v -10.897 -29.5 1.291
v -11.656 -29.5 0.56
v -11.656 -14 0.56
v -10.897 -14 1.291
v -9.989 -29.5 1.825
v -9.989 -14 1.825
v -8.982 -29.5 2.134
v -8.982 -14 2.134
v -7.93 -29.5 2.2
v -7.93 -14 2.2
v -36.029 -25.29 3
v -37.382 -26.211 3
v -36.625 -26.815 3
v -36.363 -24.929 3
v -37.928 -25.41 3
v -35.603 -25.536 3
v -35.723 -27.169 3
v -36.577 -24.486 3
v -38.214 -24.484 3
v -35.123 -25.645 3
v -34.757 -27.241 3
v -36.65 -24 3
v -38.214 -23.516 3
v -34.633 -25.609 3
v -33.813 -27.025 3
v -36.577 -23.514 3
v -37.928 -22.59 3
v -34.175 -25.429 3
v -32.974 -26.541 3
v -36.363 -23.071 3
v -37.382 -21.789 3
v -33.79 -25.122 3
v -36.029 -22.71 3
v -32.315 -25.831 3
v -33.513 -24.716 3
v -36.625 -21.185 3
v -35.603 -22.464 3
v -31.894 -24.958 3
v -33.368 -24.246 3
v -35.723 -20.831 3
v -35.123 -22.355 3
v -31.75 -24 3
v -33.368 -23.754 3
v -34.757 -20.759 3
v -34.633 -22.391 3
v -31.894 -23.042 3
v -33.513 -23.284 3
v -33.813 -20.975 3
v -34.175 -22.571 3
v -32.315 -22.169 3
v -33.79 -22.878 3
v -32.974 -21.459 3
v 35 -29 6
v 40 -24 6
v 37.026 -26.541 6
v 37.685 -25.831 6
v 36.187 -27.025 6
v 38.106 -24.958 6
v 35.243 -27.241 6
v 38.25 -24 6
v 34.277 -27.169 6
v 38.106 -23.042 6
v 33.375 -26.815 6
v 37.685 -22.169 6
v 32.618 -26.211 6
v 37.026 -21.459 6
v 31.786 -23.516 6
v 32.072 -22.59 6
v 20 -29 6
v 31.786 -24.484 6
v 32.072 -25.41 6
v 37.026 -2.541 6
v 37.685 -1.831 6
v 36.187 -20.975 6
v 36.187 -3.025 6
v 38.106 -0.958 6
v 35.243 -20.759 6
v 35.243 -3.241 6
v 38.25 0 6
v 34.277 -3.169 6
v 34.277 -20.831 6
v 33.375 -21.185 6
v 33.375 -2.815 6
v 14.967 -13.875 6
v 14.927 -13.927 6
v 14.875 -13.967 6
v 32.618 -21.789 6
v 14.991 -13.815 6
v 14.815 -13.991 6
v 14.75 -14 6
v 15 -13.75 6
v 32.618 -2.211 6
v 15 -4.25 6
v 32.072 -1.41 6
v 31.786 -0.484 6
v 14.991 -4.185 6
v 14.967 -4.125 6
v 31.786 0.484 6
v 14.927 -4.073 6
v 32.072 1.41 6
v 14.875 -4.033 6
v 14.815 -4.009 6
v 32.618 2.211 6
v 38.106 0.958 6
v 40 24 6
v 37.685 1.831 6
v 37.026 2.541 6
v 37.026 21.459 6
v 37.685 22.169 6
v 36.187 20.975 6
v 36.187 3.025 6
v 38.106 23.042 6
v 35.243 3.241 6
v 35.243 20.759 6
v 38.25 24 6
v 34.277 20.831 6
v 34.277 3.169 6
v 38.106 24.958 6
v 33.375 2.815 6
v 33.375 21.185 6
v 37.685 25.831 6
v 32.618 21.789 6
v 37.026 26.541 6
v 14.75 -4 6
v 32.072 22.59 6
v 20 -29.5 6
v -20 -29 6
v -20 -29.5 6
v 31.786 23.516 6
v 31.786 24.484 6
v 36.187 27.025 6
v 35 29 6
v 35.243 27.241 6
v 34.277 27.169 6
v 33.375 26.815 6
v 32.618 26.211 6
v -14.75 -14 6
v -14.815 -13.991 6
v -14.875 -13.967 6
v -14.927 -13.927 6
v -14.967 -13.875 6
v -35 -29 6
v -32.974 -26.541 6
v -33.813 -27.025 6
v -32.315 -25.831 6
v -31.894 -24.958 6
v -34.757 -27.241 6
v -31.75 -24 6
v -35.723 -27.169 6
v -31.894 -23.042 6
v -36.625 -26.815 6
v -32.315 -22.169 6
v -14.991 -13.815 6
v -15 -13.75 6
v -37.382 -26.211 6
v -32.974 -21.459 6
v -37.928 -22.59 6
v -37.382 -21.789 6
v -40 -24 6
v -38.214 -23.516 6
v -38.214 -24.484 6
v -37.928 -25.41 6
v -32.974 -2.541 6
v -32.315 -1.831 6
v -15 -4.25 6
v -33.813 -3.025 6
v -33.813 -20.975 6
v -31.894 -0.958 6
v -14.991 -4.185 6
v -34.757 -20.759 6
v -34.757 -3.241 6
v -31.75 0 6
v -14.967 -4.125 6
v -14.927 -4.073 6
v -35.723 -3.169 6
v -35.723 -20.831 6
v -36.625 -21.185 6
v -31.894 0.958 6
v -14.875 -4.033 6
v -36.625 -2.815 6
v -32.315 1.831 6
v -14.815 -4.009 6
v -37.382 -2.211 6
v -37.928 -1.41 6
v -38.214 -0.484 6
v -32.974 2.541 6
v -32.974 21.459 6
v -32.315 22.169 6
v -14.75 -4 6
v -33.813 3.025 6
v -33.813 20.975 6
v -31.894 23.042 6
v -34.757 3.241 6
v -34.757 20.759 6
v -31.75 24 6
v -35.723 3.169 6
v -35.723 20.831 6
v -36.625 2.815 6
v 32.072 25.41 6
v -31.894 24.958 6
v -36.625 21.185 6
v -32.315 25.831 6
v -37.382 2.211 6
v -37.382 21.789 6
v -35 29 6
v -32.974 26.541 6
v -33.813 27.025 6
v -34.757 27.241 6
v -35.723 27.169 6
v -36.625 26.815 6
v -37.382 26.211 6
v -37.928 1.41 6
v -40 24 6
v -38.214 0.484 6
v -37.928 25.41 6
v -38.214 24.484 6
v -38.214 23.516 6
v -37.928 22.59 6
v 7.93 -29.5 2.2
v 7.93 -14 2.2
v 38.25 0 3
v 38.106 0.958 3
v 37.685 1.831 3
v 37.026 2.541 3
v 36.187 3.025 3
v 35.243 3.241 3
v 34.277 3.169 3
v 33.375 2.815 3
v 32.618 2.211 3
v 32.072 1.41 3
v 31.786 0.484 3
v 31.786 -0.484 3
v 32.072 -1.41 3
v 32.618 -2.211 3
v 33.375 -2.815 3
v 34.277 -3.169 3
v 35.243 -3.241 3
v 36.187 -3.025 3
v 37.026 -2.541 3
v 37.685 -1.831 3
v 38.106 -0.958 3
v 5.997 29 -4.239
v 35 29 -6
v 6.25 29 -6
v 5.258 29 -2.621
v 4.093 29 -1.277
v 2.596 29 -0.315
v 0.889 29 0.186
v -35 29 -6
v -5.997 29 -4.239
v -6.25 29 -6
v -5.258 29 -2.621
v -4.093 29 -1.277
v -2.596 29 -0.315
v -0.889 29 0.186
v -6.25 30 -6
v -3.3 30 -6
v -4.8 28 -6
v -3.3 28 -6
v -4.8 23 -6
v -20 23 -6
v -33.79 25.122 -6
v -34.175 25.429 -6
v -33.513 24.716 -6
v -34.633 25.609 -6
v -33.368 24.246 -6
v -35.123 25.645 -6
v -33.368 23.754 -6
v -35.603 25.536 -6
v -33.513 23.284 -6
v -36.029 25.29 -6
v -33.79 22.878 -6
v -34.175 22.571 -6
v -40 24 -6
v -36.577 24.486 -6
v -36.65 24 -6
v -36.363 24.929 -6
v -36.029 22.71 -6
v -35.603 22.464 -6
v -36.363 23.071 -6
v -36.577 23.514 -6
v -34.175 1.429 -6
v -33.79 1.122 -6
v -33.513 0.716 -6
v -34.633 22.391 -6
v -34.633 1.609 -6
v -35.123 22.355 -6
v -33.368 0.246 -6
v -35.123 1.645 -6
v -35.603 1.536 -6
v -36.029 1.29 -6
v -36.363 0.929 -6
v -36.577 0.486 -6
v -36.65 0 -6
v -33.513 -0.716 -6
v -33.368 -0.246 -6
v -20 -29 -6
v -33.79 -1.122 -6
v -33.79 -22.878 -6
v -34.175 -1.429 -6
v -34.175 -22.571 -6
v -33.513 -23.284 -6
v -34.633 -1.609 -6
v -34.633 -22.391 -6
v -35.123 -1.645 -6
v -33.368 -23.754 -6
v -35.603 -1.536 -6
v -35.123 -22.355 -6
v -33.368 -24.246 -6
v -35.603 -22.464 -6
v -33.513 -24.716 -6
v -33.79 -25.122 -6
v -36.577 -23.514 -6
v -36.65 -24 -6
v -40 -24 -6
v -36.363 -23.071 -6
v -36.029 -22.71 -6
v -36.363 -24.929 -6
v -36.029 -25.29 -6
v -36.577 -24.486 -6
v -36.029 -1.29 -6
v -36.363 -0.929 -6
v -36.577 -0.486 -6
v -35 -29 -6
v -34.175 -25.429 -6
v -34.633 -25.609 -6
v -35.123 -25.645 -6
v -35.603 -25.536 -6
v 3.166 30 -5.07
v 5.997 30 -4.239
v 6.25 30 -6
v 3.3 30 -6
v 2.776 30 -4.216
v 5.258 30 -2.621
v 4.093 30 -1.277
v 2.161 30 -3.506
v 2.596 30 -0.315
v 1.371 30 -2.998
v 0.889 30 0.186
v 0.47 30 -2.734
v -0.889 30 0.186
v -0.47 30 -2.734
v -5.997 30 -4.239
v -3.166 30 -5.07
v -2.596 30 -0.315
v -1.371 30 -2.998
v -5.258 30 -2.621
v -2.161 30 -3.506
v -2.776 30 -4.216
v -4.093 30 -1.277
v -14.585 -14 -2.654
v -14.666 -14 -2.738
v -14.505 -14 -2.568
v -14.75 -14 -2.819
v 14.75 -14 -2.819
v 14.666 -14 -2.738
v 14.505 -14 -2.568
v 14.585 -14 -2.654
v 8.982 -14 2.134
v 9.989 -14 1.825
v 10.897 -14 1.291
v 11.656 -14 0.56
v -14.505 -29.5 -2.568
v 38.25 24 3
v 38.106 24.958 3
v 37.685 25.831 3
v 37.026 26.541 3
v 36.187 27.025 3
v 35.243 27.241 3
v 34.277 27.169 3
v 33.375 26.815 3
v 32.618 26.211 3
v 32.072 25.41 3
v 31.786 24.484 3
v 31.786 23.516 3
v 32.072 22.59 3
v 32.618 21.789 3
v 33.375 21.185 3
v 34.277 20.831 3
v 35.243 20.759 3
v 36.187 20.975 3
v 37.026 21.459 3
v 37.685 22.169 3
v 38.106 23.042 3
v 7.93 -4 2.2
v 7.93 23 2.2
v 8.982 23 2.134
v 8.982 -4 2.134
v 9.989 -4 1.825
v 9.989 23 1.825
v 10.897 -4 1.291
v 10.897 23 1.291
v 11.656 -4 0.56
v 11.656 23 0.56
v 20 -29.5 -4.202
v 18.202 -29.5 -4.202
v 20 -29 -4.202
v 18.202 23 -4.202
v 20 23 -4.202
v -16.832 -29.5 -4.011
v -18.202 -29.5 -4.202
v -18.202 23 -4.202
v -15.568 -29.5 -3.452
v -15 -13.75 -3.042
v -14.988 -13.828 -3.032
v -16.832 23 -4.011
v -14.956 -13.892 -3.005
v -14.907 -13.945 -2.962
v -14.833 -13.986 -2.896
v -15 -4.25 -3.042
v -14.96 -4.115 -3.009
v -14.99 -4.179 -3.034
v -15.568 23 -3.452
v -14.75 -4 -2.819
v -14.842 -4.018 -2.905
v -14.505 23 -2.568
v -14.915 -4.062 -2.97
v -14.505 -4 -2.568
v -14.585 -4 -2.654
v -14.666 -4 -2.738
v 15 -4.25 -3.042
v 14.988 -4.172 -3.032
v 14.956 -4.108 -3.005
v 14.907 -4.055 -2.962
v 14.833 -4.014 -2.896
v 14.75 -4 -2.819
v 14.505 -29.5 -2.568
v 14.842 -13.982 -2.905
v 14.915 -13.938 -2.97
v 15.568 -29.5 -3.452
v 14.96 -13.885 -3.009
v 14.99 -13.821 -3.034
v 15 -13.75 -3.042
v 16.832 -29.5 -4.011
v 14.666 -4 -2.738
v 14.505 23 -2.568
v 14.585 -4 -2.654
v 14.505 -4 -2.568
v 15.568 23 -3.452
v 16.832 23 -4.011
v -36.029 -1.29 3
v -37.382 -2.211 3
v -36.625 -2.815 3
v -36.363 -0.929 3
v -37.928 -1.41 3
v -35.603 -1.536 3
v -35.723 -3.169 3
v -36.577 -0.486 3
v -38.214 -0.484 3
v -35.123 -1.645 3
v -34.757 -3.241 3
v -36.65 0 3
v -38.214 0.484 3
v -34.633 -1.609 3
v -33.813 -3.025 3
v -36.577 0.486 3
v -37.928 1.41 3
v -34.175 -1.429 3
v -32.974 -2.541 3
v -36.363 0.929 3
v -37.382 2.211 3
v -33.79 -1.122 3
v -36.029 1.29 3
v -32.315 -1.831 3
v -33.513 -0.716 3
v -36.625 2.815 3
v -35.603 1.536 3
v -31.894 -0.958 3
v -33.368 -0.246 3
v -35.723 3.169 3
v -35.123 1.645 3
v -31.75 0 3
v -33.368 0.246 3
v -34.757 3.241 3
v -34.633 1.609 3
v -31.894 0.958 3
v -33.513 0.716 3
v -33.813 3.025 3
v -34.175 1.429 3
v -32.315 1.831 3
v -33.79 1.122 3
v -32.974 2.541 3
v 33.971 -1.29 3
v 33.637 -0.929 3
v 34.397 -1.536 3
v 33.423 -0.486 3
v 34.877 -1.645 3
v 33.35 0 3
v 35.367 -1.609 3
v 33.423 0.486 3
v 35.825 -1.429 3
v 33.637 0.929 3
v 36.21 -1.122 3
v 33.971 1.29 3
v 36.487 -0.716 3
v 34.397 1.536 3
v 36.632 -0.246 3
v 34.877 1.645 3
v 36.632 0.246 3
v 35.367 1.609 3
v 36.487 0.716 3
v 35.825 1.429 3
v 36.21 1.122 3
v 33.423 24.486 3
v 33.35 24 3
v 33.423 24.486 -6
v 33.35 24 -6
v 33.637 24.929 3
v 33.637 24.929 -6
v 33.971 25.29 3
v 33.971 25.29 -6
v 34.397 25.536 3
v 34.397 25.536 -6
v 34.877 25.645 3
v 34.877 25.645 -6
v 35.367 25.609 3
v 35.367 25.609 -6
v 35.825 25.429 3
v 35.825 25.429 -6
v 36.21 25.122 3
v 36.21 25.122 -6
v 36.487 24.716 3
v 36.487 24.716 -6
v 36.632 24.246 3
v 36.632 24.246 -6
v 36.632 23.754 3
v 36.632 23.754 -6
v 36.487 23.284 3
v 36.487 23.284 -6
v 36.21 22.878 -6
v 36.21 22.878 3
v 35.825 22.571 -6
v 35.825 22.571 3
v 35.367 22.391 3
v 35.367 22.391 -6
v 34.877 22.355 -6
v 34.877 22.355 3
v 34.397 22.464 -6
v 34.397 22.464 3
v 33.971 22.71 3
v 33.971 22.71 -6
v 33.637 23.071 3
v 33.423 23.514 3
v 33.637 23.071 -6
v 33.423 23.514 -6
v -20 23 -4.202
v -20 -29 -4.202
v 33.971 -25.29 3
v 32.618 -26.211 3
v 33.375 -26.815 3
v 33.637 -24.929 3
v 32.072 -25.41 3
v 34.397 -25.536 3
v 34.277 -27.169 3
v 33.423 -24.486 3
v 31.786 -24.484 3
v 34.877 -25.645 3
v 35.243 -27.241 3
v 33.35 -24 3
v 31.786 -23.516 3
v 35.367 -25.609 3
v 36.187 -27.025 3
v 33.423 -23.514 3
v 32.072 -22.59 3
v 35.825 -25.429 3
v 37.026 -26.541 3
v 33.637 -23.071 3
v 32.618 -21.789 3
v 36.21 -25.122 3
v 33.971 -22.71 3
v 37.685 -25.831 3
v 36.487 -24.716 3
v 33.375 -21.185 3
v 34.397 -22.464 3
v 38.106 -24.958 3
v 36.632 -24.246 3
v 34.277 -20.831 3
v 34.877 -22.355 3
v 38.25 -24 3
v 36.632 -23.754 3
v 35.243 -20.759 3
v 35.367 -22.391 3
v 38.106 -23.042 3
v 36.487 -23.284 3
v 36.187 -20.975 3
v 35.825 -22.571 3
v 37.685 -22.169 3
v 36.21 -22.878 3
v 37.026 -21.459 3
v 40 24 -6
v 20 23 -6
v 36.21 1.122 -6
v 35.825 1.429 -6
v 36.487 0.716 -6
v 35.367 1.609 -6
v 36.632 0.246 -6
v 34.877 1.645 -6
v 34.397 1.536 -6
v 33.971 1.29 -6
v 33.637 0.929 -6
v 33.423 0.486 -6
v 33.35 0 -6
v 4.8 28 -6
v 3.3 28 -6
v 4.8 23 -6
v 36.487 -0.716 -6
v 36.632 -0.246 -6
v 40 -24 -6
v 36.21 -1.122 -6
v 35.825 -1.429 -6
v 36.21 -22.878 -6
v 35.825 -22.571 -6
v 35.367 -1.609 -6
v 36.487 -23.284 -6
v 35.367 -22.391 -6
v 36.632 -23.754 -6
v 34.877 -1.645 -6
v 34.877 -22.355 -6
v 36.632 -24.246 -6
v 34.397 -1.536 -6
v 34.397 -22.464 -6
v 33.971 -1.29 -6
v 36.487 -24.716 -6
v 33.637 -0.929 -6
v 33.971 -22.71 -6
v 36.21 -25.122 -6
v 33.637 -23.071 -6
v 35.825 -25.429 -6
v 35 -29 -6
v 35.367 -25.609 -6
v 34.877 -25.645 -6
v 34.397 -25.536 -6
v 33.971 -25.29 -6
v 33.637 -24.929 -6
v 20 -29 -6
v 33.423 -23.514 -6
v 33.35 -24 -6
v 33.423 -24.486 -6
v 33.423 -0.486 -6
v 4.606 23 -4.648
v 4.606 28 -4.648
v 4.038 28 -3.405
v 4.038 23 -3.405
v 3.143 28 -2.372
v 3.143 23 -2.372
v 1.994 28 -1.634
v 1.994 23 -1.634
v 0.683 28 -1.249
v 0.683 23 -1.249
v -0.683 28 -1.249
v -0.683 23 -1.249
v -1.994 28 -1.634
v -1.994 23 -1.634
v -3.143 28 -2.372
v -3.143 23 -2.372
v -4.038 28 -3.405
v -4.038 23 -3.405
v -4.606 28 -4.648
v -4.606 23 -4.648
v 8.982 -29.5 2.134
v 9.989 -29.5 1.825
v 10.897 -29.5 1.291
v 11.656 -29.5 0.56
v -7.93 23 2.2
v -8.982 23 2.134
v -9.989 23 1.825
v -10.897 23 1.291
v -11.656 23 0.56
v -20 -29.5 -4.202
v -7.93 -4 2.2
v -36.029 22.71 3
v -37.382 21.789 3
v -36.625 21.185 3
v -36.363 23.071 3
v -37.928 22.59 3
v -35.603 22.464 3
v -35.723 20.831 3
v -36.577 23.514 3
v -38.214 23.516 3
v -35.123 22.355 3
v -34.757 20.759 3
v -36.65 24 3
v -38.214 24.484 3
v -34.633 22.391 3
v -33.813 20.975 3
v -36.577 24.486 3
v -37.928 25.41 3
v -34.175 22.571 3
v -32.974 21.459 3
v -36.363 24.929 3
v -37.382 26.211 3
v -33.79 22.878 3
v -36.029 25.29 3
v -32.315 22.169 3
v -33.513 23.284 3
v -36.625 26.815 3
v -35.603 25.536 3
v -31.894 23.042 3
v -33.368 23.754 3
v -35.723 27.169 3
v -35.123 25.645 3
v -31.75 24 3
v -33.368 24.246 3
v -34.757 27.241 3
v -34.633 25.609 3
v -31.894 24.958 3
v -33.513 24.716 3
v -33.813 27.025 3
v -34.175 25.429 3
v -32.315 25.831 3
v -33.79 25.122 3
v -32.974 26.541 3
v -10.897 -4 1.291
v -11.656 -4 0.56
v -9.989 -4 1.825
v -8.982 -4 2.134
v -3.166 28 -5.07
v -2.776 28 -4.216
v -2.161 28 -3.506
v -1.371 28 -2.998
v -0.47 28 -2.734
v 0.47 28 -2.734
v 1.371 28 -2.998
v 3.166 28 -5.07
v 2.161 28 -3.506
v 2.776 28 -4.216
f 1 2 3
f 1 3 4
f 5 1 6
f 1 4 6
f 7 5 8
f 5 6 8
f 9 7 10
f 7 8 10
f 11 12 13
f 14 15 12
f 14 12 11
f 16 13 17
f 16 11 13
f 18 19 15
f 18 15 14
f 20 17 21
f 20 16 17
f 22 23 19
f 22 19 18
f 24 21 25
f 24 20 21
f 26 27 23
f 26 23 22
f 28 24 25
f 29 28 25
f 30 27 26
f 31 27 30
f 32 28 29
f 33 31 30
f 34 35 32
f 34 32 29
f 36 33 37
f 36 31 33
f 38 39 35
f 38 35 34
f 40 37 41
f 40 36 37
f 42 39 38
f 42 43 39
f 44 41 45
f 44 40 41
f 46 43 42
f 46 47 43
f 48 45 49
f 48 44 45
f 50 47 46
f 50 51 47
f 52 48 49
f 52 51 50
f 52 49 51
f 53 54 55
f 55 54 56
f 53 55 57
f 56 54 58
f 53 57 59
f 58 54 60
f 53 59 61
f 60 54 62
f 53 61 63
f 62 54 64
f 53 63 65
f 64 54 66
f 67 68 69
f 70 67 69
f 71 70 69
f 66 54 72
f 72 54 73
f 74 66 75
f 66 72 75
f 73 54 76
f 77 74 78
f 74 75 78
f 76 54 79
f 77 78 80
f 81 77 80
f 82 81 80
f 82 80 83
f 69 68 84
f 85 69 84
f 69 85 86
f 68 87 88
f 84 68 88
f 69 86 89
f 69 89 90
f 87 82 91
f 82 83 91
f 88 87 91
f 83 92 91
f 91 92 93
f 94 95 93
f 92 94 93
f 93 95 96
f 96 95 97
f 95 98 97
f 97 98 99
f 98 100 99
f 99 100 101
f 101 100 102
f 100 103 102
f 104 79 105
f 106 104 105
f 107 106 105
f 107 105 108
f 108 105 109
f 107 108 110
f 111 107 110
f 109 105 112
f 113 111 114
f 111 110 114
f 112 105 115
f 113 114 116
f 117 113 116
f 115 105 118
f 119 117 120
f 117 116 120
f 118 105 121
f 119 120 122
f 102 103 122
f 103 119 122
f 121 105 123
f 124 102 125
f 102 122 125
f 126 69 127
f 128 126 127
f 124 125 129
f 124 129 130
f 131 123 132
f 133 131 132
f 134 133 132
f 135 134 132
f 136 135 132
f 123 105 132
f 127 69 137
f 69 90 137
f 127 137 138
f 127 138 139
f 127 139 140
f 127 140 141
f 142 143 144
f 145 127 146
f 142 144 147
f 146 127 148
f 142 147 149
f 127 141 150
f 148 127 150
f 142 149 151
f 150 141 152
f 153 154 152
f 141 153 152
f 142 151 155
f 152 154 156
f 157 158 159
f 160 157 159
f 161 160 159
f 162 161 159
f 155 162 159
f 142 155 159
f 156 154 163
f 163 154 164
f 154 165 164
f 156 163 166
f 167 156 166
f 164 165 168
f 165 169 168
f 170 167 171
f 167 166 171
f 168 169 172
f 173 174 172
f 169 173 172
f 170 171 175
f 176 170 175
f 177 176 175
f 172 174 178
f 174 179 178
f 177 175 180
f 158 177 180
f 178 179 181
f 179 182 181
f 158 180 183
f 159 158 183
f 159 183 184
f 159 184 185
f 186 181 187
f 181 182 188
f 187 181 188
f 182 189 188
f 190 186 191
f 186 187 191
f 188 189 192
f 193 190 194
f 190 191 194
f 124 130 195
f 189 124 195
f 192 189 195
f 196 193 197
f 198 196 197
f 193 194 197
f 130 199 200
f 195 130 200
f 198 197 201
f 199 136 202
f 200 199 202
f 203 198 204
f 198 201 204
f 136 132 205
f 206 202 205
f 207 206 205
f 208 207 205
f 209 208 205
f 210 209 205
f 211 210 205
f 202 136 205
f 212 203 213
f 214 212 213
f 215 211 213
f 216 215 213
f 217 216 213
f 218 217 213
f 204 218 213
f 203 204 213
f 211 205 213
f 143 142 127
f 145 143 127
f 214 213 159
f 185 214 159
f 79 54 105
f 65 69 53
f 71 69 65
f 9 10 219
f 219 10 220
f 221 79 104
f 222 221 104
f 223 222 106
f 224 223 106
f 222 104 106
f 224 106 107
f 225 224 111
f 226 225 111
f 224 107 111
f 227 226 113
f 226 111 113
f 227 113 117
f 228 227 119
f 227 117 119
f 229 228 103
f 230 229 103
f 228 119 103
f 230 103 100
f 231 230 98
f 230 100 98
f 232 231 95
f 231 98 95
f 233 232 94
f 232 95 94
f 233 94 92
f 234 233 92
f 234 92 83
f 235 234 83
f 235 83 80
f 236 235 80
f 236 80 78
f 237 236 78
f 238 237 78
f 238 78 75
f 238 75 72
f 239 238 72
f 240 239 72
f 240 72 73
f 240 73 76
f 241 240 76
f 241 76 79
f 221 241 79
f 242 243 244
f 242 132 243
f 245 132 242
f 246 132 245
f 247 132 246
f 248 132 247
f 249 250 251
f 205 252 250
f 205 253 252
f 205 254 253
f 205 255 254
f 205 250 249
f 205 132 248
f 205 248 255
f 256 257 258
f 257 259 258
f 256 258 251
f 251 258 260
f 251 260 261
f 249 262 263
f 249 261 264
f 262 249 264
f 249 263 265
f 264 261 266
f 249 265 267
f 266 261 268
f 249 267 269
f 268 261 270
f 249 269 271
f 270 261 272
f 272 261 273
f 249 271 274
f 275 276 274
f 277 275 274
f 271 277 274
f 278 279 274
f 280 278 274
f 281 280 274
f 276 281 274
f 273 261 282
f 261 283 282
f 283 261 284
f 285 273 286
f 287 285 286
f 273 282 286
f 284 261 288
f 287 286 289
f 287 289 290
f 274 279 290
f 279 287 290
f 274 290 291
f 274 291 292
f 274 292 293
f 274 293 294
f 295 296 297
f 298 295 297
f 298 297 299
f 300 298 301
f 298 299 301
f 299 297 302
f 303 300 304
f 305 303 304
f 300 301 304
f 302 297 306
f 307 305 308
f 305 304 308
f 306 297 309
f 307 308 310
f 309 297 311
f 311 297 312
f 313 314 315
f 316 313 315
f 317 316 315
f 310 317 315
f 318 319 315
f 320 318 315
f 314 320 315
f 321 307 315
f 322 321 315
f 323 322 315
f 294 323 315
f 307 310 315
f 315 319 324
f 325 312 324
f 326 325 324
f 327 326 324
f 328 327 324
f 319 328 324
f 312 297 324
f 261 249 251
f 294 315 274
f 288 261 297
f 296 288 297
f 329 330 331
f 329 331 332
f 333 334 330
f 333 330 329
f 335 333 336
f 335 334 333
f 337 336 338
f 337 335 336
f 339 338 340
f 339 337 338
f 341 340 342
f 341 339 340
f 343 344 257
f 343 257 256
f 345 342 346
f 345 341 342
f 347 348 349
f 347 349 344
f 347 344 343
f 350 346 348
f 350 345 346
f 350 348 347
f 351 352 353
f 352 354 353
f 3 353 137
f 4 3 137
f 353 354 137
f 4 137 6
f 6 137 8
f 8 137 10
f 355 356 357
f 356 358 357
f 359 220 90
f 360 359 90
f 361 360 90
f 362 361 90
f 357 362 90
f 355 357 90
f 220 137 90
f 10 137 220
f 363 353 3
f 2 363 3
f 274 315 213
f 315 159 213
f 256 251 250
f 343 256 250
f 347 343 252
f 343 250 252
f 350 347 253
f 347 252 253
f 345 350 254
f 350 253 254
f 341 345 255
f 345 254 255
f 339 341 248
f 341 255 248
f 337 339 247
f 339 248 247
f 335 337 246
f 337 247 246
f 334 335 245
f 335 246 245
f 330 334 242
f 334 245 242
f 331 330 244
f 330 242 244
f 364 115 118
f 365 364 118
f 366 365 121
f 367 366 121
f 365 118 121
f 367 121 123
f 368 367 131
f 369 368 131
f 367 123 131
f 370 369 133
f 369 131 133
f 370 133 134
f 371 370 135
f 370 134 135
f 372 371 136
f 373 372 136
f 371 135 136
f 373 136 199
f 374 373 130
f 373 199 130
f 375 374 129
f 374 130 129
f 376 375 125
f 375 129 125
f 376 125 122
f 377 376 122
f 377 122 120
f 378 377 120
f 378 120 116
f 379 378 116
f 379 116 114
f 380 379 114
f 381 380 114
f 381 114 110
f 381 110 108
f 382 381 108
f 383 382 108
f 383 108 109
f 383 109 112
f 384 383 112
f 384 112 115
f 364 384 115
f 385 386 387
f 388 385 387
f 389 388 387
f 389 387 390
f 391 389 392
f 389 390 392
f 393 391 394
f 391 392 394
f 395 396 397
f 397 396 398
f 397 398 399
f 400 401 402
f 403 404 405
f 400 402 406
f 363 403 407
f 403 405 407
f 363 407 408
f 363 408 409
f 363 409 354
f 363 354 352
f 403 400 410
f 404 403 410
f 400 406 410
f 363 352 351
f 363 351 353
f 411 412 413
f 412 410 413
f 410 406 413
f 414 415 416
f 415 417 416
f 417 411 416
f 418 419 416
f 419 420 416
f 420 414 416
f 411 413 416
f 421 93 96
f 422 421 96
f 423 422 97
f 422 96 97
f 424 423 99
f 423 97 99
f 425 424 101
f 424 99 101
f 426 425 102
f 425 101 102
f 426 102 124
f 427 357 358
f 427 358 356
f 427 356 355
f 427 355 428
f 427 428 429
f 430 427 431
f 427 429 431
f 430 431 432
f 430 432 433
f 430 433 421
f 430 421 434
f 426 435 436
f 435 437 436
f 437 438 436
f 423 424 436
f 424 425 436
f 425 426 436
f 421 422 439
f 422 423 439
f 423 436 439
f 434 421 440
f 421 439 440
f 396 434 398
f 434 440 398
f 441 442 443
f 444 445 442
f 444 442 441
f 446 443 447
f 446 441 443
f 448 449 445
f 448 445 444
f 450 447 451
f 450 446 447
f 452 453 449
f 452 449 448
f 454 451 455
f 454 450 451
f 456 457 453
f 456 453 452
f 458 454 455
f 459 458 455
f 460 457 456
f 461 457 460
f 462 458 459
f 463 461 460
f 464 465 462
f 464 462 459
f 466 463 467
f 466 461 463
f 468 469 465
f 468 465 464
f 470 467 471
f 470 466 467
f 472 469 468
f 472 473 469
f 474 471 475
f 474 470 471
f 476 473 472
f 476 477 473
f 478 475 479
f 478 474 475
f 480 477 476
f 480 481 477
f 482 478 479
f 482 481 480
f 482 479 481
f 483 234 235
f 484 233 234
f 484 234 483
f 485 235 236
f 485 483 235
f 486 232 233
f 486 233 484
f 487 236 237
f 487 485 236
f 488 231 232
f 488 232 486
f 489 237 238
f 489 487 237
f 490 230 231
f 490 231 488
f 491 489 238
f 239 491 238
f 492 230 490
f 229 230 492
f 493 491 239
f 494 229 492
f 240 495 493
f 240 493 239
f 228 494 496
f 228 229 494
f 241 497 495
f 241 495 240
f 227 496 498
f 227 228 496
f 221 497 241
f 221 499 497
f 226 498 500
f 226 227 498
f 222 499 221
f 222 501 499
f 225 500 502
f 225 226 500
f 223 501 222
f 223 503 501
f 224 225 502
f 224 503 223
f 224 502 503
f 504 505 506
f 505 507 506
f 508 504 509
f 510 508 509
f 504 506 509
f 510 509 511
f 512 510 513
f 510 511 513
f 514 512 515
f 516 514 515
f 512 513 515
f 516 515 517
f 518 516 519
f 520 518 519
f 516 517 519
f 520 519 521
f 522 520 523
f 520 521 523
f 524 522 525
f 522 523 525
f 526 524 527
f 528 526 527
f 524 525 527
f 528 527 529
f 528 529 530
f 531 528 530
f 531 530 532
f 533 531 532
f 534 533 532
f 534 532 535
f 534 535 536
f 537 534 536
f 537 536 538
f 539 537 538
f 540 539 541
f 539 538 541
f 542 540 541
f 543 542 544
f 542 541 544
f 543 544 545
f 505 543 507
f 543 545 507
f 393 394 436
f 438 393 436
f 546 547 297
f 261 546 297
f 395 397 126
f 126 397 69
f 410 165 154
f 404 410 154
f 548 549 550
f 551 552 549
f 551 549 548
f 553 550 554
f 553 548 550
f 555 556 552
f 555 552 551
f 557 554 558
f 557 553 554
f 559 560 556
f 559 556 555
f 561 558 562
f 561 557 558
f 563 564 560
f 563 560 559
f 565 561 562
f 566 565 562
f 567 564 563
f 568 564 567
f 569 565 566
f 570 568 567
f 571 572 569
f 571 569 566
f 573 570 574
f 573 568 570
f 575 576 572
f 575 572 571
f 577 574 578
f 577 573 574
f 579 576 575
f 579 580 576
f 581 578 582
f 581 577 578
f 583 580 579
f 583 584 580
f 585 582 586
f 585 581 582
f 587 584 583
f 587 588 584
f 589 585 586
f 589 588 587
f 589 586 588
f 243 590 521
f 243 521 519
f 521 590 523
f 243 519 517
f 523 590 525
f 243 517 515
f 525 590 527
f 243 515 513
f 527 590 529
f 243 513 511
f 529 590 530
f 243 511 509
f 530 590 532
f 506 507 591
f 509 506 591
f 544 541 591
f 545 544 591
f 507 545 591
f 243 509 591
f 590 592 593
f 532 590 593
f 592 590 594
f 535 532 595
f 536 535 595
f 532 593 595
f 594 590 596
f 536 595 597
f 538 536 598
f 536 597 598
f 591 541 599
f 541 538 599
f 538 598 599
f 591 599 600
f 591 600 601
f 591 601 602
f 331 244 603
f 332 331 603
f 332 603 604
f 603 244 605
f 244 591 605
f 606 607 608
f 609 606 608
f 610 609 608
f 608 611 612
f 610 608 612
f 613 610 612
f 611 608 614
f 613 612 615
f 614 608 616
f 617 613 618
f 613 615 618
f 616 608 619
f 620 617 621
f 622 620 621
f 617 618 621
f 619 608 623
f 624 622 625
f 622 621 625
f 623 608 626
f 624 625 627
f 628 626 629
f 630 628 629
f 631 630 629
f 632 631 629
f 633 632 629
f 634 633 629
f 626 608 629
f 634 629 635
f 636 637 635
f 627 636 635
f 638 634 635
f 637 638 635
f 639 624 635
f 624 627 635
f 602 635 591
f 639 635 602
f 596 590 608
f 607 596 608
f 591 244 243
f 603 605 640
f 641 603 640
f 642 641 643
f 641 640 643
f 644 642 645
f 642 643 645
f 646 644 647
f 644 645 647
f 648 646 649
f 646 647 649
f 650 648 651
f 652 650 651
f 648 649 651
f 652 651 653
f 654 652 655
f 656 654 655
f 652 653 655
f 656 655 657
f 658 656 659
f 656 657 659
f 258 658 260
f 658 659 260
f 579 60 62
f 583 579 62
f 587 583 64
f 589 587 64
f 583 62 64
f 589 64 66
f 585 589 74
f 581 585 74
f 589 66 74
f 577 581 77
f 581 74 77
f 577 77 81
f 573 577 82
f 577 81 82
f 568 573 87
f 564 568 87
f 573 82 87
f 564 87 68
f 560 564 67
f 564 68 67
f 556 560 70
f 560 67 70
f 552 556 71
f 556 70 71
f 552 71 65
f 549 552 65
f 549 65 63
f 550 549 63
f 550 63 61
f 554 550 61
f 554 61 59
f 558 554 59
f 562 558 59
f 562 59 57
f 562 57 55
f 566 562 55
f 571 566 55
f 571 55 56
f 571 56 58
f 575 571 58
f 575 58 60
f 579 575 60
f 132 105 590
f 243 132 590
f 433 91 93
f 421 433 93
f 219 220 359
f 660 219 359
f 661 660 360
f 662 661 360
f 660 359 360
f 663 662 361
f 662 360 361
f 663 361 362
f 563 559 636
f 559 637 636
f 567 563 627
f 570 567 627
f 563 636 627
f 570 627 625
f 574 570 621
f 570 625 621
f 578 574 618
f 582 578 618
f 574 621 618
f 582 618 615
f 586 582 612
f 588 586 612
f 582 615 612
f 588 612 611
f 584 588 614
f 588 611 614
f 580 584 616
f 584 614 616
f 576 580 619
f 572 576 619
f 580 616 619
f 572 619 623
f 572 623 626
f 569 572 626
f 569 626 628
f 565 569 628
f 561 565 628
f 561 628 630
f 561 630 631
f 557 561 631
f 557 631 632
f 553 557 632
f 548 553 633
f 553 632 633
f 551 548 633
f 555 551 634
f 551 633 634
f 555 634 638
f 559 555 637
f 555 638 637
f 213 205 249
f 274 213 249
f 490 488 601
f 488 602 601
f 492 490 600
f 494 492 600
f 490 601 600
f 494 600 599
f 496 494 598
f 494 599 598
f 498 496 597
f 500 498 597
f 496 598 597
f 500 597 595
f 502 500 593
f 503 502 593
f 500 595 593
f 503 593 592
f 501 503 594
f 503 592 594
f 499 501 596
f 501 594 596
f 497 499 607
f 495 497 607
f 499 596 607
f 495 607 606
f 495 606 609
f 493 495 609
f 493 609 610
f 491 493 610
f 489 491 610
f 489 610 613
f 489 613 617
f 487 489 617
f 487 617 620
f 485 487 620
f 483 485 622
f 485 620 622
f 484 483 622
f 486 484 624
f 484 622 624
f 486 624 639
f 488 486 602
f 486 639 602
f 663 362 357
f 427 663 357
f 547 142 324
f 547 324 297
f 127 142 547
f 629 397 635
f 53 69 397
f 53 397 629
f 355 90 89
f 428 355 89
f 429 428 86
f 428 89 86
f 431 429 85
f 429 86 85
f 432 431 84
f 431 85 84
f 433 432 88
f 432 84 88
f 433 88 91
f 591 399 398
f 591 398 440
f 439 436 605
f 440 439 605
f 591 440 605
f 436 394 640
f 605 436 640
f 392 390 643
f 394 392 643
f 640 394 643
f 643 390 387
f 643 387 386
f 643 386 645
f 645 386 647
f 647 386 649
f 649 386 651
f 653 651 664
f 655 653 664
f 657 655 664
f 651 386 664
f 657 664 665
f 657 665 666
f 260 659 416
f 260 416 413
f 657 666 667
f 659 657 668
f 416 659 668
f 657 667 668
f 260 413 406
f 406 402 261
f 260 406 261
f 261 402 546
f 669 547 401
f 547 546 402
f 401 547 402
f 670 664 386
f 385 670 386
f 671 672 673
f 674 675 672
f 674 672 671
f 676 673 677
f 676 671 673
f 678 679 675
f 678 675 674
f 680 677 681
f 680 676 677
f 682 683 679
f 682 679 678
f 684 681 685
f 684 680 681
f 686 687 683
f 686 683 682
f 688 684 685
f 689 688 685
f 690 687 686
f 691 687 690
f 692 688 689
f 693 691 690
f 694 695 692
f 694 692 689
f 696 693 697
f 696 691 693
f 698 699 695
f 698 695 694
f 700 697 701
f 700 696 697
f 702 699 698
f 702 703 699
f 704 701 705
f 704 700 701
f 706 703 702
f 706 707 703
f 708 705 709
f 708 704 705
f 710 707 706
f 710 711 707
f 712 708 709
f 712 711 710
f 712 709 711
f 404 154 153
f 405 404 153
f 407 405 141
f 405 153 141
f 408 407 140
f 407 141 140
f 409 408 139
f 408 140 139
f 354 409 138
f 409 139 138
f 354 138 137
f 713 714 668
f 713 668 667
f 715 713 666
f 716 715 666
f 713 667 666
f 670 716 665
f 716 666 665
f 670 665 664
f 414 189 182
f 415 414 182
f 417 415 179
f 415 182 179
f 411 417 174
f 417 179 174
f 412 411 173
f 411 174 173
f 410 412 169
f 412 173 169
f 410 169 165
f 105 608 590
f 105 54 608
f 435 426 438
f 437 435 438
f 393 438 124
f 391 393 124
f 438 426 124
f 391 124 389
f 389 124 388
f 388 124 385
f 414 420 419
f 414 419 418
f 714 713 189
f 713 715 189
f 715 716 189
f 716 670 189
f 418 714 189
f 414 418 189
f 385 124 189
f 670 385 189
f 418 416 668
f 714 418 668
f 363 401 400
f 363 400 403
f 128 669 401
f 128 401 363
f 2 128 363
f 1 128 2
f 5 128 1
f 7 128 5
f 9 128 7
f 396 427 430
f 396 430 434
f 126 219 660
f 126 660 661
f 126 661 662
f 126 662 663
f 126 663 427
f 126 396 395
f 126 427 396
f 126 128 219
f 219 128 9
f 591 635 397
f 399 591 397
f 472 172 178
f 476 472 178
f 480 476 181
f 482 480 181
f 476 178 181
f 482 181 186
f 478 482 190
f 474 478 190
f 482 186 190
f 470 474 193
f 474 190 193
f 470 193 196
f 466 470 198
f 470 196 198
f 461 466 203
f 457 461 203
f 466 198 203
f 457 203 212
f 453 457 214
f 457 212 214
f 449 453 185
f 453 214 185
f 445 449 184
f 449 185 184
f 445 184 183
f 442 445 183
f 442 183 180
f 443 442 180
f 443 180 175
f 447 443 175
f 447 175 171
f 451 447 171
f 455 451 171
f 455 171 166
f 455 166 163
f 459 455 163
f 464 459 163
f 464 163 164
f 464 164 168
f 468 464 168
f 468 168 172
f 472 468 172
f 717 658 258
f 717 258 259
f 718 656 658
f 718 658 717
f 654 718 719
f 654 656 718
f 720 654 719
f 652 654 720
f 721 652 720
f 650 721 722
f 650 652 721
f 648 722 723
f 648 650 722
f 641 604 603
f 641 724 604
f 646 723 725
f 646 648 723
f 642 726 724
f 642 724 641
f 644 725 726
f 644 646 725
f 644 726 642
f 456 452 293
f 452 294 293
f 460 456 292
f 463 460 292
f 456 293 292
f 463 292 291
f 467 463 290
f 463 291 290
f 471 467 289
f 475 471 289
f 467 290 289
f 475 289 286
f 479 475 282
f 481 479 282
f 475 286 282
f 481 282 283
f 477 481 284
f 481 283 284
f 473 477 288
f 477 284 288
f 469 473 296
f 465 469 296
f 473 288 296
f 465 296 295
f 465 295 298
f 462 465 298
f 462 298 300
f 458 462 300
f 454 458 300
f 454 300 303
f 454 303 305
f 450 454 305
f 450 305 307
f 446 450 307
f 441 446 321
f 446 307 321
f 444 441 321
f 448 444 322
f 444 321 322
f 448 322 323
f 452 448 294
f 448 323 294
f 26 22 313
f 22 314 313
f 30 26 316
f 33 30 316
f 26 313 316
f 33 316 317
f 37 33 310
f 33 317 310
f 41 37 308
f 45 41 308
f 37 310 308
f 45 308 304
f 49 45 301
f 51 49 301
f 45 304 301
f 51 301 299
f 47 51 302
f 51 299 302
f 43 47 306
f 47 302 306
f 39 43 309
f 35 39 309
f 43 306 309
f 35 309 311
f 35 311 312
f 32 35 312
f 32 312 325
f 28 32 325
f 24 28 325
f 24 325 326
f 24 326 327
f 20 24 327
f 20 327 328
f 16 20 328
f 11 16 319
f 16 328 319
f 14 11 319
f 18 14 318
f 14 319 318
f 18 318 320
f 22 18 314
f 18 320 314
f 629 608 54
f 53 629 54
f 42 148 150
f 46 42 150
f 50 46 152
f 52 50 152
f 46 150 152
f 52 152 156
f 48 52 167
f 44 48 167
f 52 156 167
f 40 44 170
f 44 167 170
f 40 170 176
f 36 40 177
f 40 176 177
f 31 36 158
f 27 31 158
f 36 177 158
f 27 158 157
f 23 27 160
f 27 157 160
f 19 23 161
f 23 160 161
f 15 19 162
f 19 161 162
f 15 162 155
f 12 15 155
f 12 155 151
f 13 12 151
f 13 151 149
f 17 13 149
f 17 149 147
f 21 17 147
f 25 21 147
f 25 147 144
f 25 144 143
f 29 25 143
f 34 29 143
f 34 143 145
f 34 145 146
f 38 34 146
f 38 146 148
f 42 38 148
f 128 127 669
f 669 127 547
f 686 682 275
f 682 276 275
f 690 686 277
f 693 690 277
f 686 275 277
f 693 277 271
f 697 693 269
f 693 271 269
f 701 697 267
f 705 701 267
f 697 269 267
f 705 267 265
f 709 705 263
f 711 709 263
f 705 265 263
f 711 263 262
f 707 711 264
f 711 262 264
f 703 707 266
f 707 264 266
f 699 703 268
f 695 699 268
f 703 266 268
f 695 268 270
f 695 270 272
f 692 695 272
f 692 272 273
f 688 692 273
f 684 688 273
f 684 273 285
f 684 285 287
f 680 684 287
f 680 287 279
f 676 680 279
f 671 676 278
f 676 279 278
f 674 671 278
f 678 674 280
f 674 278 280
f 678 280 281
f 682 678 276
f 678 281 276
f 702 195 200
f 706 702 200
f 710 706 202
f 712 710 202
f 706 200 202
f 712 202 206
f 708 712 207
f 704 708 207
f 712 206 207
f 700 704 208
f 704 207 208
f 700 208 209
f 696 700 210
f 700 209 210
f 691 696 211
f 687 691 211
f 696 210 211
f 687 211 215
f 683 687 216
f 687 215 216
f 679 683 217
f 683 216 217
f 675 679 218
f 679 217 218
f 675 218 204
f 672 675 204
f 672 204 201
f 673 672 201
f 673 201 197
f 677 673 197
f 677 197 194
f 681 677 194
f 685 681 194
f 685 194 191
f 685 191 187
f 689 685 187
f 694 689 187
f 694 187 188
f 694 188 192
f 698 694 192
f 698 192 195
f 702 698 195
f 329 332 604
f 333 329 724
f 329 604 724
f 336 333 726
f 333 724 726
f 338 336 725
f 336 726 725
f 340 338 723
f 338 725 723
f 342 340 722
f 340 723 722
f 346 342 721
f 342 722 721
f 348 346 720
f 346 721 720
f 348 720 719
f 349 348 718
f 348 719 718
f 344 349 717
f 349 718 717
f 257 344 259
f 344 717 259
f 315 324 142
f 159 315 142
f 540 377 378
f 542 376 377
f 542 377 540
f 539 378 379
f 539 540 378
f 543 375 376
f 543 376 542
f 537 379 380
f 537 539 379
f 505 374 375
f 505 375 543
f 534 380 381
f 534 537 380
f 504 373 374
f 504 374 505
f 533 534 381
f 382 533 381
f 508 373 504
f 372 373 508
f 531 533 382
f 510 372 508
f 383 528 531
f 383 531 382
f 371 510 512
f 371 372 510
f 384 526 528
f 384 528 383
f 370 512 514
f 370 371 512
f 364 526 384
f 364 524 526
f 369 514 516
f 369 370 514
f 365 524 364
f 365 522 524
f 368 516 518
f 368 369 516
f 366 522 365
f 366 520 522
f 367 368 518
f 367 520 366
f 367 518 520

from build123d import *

# Parameters (mm, degrees)
F0_W           = 80
F0_H           = 58
F1_DEPTH       = 6
F3_DEPTH       = 60
F4_SIZE        = 5
F6_D           = 3.3
F6_CBORE_D     = 6.5
F6_CBORE_DEPTH = 3
F8_DEPTH       = 0.5
F10_DEPTH      = 6
F11_R          = 4.8
F12_DEPTH      = 5
F14_DEPTH      = 1
F16_DEPTH      = 12.001


with BuildPart() as f1:
    # F0 (on Top) → F1 (new body, symmetric)
    with BuildSketch(Plane.XY):
        Rectangle(F0_W, F0_H)
    extrude(amount=F1_DEPTH, both=True)

    # F2 (on Front) → F3 (cut, symmetric)
    with BuildSketch(Plane.XZ):
        with BuildLine():
            ThreePointArc((-14.50485, -2.5683595528), (-16.1807477573, -3.7753797852), (-18.2015, -4.2021016015))
            Line((-18.2015, -4.2021016015), (-20, -4.2021016015))
            Line((-20, -4.2021016015), (-20, -6))
            Line((-20, -6), (20, -6))
            Line((20, -6), (20, -4.2021016015))
            Line((20, -4.2021016015), (18.2015, -4.2021016015))
            ThreePointArc((18.2015, -4.2021016015), (16.1807477573, -3.7753797852), (14.50485, -2.5683595528))
            Line((14.50485, -2.5683595528), (11.656, 0.56))
            ThreePointArc((11.656, 0.56), (9.9890562195, 1.8254301669), (7.93, 2.2))
            Line((7.93, 2.2), (-7.93, 2.2))
            ThreePointArc((-7.93, 2.2), (-9.9890562195, 1.8254301669), (-11.656, 0.56))
            Line((-11.656, 0.56), (-14.50485, -2.5683595528))
        make_face()
    extrude(amount=F3_DEPTH, both=True, mode=Mode.SUBTRACT)

    # F4
    f4_edges = [f1.edges().sort_by_distance(p)[0] for p in [
        (-40, 29, 0),
        (-40, -29, 0),
        (40, -29, 0),
        (40, 29, 0),
    ]]
    chamfer(f4_edges, length=F4_SIZE)

    # F6 (through all)
    with Locations(Plane.XY.offset(6)):
        with Locations((-35, 24), (35, 24), (35, 0), (35, -24), (-35, -24), (-35, 0)):
            CounterBoreHole(F6_D / 2, F6_CBORE_D / 2, F6_CBORE_DEPTH)

    # F7 (on face) → F8 (join)
    with BuildSketch(Plane.XZ.offset(29)):
        with BuildLine():
            Line((-20, 6), (-20, -4.2021016015))
            Line((-20, -4.2021016015), (-18.2015, -4.2021016015))
            ThreePointArc((-18.2015, -4.2021016015), (-16.1807477573, -3.7753797852), (-14.50485, -2.5683595528))
            Line((-14.50485, -2.5683595528), (-11.656, 0.56))
            ThreePointArc((-11.656, 0.56), (-9.9890562195, 1.8254301669), (-7.93, 2.2))
            Line((-7.93, 2.2), (7.93, 2.2))
            ThreePointArc((7.93, 2.2), (9.9890562195, 1.8254301669), (11.656, 0.56))
            Line((11.656, 0.56), (14.50485, -2.5683595528))
            ThreePointArc((14.50485, -2.5683595528), (16.1807477573, -3.7753797852), (18.2015, -4.2021016015))
            Line((18.2015, -4.2021016015), (20, -4.2021016015))
            Line((20, -4.2021016015), (20, 6))
            Line((20, 6), (-20, 6))
        make_face()
    extrude(amount=F8_DEPTH)

    # F9 (on face) → F10 (join)
    with BuildSketch(Plane(origin=(0, 29, 0), x_dir=(-1, 0, 0), z_dir=(0, 1, 0))):
        with BuildLine():
            Line((-20, -4.2021016015), (-20, -6))
            Line((-20, -6), (-3.3, -6))
            ThreePointArc((-3.3, -6), (0, -2.7), (3.3, -6))
            Line((3.3, -6), (20, -6))
            Line((20, -6), (20, -4.2021016015))
            Line((20, -4.2021016015), (18.2015, -4.2021016015))
            ThreePointArc((18.2015, -4.2021016015), (16.1807477573, -3.7753797852), (14.50485, -2.5683595528))
            Line((14.50485, -2.5683595528), (11.656, 0.56))
            ThreePointArc((11.656, 0.56), (9.9890562195, 1.8254301669), (7.93, 2.2))
            Line((7.93, 2.2), (-7.93, 2.2))
            ThreePointArc((-7.93, 2.2), (-9.9890562195, 1.8254301669), (-11.656, 0.56))
            Line((-11.656, 0.56), (-14.50485, -2.5683595528))
            ThreePointArc((-14.50485, -2.5683595528), (-16.1807477573, -3.7753797852), (-18.2015, -4.2021016015))
            Line((-18.2015, -4.2021016015), (-20, -4.2021016015))
        make_face()
    extrude(amount=-F10_DEPTH)

    # F11 (on face) → F12 (cut)
    with BuildSketch(Plane.XZ.offset(-23)):
        with Locations((0, -6)):
            Circle(F11_R)
    extrude(amount=-F12_DEPTH, mode=Mode.SUBTRACT)

    # F13 (on face) → F14 (join)
    with BuildSketch(Plane(origin=(0, 29, 0), x_dir=(-1, 0, 0), z_dir=(0, 1, 0))):
        with BuildLine():
            ThreePointArc((-3.3, -6), (0, -2.7), (3.3, -6))
            Line((3.3, -6), (6.25, -6))
            ThreePointArc((6.25, -6), (0, 0.25), (-6.25, -6))
            Line((-6.25, -6), (-3.3, -6))
        make_face()
    extrude(amount=F14_DEPTH)

    # F15 (on face) → F16 (cut, through all)
    with BuildSketch(Plane.XY.offset(6)):
        with BuildLine():
            Line((14.75, -4), (-14.75, -4))
            ThreePointArc((-14.75, -4), (-14.9267766953, -4.0732233047), (-15, -4.25))
            Line((-15, -4.25), (-15, -13.75))
            ThreePointArc((-15, -13.75), (-14.9267766953, -13.9267766953), (-14.75, -14))
            Line((-14.75, -14), (14.75, -14))
            ThreePointArc((14.75, -14), (14.9267766953, -13.9267766953), (15, -13.75))
            Line((15, -13.75), (15, -4.25))
            ThreePointArc((15, -4.25), (14.9267766953, -4.0732233047), (14.75, -4))
        make_face()
    extrude(amount=-F16_DEPTH, mode=Mode.SUBTRACT)


solid = f1.part
